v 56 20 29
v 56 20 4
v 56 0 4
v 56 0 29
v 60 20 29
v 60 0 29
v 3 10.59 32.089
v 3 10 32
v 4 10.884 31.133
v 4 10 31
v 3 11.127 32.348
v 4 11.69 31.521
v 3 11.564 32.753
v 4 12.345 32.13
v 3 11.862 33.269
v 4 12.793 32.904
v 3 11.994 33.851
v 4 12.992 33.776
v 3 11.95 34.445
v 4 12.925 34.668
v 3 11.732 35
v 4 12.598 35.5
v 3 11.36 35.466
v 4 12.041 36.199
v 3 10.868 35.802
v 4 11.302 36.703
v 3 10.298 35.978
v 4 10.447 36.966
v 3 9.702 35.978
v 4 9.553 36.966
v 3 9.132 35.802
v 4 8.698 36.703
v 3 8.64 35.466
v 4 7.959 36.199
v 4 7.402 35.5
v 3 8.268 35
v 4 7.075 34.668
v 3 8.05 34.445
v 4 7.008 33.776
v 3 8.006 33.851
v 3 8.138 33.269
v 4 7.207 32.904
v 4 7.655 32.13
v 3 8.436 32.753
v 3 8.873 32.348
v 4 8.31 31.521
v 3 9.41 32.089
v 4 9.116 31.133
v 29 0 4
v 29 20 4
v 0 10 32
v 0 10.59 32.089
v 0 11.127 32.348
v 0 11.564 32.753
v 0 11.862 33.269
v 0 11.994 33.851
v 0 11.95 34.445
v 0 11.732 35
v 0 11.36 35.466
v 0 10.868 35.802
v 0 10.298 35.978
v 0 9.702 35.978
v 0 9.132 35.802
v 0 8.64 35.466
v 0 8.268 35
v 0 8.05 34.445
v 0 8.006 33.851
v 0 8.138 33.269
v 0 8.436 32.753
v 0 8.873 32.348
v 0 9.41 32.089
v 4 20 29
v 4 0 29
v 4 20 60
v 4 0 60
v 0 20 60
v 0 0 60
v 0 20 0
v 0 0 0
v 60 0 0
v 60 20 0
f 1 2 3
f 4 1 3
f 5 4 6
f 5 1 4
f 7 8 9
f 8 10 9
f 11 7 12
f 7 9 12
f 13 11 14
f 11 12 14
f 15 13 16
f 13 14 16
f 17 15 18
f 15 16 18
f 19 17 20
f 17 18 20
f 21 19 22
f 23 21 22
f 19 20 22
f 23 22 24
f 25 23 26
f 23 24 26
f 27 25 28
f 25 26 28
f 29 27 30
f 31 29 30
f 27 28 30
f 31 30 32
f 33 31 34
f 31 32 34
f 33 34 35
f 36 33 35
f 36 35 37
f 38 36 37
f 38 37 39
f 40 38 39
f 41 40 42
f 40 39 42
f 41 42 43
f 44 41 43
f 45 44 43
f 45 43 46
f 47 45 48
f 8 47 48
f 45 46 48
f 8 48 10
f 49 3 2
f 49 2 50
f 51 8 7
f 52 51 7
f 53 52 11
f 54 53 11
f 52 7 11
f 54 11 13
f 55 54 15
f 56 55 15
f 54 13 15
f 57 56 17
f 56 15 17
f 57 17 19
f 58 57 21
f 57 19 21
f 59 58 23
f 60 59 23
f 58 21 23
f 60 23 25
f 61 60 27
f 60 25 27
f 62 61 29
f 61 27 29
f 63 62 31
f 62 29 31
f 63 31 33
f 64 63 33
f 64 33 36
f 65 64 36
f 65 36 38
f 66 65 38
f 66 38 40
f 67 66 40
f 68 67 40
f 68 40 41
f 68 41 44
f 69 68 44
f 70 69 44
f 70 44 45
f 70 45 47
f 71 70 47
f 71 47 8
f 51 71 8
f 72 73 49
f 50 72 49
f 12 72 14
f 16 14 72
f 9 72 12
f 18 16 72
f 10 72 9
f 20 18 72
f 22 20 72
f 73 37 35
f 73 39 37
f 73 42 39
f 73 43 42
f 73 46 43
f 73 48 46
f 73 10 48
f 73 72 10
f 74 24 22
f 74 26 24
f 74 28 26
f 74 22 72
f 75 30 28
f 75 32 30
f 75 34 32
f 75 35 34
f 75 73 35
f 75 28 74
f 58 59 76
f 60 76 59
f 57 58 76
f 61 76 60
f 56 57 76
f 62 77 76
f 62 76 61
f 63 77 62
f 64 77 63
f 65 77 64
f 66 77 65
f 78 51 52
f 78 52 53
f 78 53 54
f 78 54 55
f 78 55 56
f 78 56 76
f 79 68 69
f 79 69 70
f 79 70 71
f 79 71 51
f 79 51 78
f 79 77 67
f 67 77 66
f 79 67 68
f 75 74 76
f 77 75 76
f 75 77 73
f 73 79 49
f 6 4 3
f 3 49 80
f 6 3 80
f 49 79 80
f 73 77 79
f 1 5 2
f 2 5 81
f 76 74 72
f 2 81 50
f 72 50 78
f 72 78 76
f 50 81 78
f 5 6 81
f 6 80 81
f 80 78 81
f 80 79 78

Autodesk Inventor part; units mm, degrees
ref_plane "YZ Plane" through (0, 0, 0) normal (1, 0, 0) x (0, 1, 0)
ref_plane "XZ Plane" through (0, 0, 0) normal (0, 1, 0) x (-1, 0, 0)
ref_plane "XY Plane" through (0, 0, 0) normal (0, 0, 1) x (1, 0, 0)
sketch "Эскиз1" plane through (0, 0, 0) normal (0, 1, 0) x (-1, 0, 0)
  line L0 (0, 0) -> (-4, 0)
  line L1 (-4, 29) -> (-4, 60)
  line L2 (-4, 60) -> (0, 60)
  line L3 (0, 60) -> (0, 0)
  line L4 (0, 0) -> (-60, 0)
  line L5 (-60, 0) -> (-60, 4)
  line L6 (-60, 4) -> (-29, 4)
  line L7 (0, 4) -> (0, 0)
  line L8 (-4, 29) -> (-29, 4)
  dimension "d0" = 4
  dimension "d1" = 60
  dimension "d2" = 60
  dimension "d3" = 4
  dimension "d4" = 25
  dimension "d5" = 25
extrude "Выдавливание1" add sketch "Эскиз1" along normal blind 20
sketch "Эскиз2" plane through (4, 0, 60) normal (1, 0, 0) x (0, 0, -1)
  line L0 (0, 20) -> (31, 20) projected
  line L1 (0, 0) -> (0, 20) projected
  circle A0 centre (26, 10) radius 2
  line L2 (31, 0) -> (31, 20) projected
  point P0 (60, 0)
  dimension "d11" = 4
  dimension "d12" = 5
extrude "Выдавливание2" cut sketch "Эскиз2" against normal blind 10
chamfer "Фаска1" distance 1 angle 45 1 edges at (4, 10, 36)
sketch "Эскиз3" plane through (29, 0, 4) normal (0, 0, 1) x (1, 0, 0)
  line L0 (31, 0) -> (31, 20) projected
  line L1 (31, 20) -> (27, 20)
  line L2 (27, 20) -> (27, 0)
  line L3 (27, 0) -> (31, 0)
  line L4 (31, 0) -> (31, 20)
  line L5 (0, 0) -> (31, 0) projected
  point P0 (-29, 0)
  point P1 (29, 0)
  dimension "d18" = 4
extrude "Выдавливание3" add sketch "Эскиз3" along normal blind 25
properties part number "corner"
